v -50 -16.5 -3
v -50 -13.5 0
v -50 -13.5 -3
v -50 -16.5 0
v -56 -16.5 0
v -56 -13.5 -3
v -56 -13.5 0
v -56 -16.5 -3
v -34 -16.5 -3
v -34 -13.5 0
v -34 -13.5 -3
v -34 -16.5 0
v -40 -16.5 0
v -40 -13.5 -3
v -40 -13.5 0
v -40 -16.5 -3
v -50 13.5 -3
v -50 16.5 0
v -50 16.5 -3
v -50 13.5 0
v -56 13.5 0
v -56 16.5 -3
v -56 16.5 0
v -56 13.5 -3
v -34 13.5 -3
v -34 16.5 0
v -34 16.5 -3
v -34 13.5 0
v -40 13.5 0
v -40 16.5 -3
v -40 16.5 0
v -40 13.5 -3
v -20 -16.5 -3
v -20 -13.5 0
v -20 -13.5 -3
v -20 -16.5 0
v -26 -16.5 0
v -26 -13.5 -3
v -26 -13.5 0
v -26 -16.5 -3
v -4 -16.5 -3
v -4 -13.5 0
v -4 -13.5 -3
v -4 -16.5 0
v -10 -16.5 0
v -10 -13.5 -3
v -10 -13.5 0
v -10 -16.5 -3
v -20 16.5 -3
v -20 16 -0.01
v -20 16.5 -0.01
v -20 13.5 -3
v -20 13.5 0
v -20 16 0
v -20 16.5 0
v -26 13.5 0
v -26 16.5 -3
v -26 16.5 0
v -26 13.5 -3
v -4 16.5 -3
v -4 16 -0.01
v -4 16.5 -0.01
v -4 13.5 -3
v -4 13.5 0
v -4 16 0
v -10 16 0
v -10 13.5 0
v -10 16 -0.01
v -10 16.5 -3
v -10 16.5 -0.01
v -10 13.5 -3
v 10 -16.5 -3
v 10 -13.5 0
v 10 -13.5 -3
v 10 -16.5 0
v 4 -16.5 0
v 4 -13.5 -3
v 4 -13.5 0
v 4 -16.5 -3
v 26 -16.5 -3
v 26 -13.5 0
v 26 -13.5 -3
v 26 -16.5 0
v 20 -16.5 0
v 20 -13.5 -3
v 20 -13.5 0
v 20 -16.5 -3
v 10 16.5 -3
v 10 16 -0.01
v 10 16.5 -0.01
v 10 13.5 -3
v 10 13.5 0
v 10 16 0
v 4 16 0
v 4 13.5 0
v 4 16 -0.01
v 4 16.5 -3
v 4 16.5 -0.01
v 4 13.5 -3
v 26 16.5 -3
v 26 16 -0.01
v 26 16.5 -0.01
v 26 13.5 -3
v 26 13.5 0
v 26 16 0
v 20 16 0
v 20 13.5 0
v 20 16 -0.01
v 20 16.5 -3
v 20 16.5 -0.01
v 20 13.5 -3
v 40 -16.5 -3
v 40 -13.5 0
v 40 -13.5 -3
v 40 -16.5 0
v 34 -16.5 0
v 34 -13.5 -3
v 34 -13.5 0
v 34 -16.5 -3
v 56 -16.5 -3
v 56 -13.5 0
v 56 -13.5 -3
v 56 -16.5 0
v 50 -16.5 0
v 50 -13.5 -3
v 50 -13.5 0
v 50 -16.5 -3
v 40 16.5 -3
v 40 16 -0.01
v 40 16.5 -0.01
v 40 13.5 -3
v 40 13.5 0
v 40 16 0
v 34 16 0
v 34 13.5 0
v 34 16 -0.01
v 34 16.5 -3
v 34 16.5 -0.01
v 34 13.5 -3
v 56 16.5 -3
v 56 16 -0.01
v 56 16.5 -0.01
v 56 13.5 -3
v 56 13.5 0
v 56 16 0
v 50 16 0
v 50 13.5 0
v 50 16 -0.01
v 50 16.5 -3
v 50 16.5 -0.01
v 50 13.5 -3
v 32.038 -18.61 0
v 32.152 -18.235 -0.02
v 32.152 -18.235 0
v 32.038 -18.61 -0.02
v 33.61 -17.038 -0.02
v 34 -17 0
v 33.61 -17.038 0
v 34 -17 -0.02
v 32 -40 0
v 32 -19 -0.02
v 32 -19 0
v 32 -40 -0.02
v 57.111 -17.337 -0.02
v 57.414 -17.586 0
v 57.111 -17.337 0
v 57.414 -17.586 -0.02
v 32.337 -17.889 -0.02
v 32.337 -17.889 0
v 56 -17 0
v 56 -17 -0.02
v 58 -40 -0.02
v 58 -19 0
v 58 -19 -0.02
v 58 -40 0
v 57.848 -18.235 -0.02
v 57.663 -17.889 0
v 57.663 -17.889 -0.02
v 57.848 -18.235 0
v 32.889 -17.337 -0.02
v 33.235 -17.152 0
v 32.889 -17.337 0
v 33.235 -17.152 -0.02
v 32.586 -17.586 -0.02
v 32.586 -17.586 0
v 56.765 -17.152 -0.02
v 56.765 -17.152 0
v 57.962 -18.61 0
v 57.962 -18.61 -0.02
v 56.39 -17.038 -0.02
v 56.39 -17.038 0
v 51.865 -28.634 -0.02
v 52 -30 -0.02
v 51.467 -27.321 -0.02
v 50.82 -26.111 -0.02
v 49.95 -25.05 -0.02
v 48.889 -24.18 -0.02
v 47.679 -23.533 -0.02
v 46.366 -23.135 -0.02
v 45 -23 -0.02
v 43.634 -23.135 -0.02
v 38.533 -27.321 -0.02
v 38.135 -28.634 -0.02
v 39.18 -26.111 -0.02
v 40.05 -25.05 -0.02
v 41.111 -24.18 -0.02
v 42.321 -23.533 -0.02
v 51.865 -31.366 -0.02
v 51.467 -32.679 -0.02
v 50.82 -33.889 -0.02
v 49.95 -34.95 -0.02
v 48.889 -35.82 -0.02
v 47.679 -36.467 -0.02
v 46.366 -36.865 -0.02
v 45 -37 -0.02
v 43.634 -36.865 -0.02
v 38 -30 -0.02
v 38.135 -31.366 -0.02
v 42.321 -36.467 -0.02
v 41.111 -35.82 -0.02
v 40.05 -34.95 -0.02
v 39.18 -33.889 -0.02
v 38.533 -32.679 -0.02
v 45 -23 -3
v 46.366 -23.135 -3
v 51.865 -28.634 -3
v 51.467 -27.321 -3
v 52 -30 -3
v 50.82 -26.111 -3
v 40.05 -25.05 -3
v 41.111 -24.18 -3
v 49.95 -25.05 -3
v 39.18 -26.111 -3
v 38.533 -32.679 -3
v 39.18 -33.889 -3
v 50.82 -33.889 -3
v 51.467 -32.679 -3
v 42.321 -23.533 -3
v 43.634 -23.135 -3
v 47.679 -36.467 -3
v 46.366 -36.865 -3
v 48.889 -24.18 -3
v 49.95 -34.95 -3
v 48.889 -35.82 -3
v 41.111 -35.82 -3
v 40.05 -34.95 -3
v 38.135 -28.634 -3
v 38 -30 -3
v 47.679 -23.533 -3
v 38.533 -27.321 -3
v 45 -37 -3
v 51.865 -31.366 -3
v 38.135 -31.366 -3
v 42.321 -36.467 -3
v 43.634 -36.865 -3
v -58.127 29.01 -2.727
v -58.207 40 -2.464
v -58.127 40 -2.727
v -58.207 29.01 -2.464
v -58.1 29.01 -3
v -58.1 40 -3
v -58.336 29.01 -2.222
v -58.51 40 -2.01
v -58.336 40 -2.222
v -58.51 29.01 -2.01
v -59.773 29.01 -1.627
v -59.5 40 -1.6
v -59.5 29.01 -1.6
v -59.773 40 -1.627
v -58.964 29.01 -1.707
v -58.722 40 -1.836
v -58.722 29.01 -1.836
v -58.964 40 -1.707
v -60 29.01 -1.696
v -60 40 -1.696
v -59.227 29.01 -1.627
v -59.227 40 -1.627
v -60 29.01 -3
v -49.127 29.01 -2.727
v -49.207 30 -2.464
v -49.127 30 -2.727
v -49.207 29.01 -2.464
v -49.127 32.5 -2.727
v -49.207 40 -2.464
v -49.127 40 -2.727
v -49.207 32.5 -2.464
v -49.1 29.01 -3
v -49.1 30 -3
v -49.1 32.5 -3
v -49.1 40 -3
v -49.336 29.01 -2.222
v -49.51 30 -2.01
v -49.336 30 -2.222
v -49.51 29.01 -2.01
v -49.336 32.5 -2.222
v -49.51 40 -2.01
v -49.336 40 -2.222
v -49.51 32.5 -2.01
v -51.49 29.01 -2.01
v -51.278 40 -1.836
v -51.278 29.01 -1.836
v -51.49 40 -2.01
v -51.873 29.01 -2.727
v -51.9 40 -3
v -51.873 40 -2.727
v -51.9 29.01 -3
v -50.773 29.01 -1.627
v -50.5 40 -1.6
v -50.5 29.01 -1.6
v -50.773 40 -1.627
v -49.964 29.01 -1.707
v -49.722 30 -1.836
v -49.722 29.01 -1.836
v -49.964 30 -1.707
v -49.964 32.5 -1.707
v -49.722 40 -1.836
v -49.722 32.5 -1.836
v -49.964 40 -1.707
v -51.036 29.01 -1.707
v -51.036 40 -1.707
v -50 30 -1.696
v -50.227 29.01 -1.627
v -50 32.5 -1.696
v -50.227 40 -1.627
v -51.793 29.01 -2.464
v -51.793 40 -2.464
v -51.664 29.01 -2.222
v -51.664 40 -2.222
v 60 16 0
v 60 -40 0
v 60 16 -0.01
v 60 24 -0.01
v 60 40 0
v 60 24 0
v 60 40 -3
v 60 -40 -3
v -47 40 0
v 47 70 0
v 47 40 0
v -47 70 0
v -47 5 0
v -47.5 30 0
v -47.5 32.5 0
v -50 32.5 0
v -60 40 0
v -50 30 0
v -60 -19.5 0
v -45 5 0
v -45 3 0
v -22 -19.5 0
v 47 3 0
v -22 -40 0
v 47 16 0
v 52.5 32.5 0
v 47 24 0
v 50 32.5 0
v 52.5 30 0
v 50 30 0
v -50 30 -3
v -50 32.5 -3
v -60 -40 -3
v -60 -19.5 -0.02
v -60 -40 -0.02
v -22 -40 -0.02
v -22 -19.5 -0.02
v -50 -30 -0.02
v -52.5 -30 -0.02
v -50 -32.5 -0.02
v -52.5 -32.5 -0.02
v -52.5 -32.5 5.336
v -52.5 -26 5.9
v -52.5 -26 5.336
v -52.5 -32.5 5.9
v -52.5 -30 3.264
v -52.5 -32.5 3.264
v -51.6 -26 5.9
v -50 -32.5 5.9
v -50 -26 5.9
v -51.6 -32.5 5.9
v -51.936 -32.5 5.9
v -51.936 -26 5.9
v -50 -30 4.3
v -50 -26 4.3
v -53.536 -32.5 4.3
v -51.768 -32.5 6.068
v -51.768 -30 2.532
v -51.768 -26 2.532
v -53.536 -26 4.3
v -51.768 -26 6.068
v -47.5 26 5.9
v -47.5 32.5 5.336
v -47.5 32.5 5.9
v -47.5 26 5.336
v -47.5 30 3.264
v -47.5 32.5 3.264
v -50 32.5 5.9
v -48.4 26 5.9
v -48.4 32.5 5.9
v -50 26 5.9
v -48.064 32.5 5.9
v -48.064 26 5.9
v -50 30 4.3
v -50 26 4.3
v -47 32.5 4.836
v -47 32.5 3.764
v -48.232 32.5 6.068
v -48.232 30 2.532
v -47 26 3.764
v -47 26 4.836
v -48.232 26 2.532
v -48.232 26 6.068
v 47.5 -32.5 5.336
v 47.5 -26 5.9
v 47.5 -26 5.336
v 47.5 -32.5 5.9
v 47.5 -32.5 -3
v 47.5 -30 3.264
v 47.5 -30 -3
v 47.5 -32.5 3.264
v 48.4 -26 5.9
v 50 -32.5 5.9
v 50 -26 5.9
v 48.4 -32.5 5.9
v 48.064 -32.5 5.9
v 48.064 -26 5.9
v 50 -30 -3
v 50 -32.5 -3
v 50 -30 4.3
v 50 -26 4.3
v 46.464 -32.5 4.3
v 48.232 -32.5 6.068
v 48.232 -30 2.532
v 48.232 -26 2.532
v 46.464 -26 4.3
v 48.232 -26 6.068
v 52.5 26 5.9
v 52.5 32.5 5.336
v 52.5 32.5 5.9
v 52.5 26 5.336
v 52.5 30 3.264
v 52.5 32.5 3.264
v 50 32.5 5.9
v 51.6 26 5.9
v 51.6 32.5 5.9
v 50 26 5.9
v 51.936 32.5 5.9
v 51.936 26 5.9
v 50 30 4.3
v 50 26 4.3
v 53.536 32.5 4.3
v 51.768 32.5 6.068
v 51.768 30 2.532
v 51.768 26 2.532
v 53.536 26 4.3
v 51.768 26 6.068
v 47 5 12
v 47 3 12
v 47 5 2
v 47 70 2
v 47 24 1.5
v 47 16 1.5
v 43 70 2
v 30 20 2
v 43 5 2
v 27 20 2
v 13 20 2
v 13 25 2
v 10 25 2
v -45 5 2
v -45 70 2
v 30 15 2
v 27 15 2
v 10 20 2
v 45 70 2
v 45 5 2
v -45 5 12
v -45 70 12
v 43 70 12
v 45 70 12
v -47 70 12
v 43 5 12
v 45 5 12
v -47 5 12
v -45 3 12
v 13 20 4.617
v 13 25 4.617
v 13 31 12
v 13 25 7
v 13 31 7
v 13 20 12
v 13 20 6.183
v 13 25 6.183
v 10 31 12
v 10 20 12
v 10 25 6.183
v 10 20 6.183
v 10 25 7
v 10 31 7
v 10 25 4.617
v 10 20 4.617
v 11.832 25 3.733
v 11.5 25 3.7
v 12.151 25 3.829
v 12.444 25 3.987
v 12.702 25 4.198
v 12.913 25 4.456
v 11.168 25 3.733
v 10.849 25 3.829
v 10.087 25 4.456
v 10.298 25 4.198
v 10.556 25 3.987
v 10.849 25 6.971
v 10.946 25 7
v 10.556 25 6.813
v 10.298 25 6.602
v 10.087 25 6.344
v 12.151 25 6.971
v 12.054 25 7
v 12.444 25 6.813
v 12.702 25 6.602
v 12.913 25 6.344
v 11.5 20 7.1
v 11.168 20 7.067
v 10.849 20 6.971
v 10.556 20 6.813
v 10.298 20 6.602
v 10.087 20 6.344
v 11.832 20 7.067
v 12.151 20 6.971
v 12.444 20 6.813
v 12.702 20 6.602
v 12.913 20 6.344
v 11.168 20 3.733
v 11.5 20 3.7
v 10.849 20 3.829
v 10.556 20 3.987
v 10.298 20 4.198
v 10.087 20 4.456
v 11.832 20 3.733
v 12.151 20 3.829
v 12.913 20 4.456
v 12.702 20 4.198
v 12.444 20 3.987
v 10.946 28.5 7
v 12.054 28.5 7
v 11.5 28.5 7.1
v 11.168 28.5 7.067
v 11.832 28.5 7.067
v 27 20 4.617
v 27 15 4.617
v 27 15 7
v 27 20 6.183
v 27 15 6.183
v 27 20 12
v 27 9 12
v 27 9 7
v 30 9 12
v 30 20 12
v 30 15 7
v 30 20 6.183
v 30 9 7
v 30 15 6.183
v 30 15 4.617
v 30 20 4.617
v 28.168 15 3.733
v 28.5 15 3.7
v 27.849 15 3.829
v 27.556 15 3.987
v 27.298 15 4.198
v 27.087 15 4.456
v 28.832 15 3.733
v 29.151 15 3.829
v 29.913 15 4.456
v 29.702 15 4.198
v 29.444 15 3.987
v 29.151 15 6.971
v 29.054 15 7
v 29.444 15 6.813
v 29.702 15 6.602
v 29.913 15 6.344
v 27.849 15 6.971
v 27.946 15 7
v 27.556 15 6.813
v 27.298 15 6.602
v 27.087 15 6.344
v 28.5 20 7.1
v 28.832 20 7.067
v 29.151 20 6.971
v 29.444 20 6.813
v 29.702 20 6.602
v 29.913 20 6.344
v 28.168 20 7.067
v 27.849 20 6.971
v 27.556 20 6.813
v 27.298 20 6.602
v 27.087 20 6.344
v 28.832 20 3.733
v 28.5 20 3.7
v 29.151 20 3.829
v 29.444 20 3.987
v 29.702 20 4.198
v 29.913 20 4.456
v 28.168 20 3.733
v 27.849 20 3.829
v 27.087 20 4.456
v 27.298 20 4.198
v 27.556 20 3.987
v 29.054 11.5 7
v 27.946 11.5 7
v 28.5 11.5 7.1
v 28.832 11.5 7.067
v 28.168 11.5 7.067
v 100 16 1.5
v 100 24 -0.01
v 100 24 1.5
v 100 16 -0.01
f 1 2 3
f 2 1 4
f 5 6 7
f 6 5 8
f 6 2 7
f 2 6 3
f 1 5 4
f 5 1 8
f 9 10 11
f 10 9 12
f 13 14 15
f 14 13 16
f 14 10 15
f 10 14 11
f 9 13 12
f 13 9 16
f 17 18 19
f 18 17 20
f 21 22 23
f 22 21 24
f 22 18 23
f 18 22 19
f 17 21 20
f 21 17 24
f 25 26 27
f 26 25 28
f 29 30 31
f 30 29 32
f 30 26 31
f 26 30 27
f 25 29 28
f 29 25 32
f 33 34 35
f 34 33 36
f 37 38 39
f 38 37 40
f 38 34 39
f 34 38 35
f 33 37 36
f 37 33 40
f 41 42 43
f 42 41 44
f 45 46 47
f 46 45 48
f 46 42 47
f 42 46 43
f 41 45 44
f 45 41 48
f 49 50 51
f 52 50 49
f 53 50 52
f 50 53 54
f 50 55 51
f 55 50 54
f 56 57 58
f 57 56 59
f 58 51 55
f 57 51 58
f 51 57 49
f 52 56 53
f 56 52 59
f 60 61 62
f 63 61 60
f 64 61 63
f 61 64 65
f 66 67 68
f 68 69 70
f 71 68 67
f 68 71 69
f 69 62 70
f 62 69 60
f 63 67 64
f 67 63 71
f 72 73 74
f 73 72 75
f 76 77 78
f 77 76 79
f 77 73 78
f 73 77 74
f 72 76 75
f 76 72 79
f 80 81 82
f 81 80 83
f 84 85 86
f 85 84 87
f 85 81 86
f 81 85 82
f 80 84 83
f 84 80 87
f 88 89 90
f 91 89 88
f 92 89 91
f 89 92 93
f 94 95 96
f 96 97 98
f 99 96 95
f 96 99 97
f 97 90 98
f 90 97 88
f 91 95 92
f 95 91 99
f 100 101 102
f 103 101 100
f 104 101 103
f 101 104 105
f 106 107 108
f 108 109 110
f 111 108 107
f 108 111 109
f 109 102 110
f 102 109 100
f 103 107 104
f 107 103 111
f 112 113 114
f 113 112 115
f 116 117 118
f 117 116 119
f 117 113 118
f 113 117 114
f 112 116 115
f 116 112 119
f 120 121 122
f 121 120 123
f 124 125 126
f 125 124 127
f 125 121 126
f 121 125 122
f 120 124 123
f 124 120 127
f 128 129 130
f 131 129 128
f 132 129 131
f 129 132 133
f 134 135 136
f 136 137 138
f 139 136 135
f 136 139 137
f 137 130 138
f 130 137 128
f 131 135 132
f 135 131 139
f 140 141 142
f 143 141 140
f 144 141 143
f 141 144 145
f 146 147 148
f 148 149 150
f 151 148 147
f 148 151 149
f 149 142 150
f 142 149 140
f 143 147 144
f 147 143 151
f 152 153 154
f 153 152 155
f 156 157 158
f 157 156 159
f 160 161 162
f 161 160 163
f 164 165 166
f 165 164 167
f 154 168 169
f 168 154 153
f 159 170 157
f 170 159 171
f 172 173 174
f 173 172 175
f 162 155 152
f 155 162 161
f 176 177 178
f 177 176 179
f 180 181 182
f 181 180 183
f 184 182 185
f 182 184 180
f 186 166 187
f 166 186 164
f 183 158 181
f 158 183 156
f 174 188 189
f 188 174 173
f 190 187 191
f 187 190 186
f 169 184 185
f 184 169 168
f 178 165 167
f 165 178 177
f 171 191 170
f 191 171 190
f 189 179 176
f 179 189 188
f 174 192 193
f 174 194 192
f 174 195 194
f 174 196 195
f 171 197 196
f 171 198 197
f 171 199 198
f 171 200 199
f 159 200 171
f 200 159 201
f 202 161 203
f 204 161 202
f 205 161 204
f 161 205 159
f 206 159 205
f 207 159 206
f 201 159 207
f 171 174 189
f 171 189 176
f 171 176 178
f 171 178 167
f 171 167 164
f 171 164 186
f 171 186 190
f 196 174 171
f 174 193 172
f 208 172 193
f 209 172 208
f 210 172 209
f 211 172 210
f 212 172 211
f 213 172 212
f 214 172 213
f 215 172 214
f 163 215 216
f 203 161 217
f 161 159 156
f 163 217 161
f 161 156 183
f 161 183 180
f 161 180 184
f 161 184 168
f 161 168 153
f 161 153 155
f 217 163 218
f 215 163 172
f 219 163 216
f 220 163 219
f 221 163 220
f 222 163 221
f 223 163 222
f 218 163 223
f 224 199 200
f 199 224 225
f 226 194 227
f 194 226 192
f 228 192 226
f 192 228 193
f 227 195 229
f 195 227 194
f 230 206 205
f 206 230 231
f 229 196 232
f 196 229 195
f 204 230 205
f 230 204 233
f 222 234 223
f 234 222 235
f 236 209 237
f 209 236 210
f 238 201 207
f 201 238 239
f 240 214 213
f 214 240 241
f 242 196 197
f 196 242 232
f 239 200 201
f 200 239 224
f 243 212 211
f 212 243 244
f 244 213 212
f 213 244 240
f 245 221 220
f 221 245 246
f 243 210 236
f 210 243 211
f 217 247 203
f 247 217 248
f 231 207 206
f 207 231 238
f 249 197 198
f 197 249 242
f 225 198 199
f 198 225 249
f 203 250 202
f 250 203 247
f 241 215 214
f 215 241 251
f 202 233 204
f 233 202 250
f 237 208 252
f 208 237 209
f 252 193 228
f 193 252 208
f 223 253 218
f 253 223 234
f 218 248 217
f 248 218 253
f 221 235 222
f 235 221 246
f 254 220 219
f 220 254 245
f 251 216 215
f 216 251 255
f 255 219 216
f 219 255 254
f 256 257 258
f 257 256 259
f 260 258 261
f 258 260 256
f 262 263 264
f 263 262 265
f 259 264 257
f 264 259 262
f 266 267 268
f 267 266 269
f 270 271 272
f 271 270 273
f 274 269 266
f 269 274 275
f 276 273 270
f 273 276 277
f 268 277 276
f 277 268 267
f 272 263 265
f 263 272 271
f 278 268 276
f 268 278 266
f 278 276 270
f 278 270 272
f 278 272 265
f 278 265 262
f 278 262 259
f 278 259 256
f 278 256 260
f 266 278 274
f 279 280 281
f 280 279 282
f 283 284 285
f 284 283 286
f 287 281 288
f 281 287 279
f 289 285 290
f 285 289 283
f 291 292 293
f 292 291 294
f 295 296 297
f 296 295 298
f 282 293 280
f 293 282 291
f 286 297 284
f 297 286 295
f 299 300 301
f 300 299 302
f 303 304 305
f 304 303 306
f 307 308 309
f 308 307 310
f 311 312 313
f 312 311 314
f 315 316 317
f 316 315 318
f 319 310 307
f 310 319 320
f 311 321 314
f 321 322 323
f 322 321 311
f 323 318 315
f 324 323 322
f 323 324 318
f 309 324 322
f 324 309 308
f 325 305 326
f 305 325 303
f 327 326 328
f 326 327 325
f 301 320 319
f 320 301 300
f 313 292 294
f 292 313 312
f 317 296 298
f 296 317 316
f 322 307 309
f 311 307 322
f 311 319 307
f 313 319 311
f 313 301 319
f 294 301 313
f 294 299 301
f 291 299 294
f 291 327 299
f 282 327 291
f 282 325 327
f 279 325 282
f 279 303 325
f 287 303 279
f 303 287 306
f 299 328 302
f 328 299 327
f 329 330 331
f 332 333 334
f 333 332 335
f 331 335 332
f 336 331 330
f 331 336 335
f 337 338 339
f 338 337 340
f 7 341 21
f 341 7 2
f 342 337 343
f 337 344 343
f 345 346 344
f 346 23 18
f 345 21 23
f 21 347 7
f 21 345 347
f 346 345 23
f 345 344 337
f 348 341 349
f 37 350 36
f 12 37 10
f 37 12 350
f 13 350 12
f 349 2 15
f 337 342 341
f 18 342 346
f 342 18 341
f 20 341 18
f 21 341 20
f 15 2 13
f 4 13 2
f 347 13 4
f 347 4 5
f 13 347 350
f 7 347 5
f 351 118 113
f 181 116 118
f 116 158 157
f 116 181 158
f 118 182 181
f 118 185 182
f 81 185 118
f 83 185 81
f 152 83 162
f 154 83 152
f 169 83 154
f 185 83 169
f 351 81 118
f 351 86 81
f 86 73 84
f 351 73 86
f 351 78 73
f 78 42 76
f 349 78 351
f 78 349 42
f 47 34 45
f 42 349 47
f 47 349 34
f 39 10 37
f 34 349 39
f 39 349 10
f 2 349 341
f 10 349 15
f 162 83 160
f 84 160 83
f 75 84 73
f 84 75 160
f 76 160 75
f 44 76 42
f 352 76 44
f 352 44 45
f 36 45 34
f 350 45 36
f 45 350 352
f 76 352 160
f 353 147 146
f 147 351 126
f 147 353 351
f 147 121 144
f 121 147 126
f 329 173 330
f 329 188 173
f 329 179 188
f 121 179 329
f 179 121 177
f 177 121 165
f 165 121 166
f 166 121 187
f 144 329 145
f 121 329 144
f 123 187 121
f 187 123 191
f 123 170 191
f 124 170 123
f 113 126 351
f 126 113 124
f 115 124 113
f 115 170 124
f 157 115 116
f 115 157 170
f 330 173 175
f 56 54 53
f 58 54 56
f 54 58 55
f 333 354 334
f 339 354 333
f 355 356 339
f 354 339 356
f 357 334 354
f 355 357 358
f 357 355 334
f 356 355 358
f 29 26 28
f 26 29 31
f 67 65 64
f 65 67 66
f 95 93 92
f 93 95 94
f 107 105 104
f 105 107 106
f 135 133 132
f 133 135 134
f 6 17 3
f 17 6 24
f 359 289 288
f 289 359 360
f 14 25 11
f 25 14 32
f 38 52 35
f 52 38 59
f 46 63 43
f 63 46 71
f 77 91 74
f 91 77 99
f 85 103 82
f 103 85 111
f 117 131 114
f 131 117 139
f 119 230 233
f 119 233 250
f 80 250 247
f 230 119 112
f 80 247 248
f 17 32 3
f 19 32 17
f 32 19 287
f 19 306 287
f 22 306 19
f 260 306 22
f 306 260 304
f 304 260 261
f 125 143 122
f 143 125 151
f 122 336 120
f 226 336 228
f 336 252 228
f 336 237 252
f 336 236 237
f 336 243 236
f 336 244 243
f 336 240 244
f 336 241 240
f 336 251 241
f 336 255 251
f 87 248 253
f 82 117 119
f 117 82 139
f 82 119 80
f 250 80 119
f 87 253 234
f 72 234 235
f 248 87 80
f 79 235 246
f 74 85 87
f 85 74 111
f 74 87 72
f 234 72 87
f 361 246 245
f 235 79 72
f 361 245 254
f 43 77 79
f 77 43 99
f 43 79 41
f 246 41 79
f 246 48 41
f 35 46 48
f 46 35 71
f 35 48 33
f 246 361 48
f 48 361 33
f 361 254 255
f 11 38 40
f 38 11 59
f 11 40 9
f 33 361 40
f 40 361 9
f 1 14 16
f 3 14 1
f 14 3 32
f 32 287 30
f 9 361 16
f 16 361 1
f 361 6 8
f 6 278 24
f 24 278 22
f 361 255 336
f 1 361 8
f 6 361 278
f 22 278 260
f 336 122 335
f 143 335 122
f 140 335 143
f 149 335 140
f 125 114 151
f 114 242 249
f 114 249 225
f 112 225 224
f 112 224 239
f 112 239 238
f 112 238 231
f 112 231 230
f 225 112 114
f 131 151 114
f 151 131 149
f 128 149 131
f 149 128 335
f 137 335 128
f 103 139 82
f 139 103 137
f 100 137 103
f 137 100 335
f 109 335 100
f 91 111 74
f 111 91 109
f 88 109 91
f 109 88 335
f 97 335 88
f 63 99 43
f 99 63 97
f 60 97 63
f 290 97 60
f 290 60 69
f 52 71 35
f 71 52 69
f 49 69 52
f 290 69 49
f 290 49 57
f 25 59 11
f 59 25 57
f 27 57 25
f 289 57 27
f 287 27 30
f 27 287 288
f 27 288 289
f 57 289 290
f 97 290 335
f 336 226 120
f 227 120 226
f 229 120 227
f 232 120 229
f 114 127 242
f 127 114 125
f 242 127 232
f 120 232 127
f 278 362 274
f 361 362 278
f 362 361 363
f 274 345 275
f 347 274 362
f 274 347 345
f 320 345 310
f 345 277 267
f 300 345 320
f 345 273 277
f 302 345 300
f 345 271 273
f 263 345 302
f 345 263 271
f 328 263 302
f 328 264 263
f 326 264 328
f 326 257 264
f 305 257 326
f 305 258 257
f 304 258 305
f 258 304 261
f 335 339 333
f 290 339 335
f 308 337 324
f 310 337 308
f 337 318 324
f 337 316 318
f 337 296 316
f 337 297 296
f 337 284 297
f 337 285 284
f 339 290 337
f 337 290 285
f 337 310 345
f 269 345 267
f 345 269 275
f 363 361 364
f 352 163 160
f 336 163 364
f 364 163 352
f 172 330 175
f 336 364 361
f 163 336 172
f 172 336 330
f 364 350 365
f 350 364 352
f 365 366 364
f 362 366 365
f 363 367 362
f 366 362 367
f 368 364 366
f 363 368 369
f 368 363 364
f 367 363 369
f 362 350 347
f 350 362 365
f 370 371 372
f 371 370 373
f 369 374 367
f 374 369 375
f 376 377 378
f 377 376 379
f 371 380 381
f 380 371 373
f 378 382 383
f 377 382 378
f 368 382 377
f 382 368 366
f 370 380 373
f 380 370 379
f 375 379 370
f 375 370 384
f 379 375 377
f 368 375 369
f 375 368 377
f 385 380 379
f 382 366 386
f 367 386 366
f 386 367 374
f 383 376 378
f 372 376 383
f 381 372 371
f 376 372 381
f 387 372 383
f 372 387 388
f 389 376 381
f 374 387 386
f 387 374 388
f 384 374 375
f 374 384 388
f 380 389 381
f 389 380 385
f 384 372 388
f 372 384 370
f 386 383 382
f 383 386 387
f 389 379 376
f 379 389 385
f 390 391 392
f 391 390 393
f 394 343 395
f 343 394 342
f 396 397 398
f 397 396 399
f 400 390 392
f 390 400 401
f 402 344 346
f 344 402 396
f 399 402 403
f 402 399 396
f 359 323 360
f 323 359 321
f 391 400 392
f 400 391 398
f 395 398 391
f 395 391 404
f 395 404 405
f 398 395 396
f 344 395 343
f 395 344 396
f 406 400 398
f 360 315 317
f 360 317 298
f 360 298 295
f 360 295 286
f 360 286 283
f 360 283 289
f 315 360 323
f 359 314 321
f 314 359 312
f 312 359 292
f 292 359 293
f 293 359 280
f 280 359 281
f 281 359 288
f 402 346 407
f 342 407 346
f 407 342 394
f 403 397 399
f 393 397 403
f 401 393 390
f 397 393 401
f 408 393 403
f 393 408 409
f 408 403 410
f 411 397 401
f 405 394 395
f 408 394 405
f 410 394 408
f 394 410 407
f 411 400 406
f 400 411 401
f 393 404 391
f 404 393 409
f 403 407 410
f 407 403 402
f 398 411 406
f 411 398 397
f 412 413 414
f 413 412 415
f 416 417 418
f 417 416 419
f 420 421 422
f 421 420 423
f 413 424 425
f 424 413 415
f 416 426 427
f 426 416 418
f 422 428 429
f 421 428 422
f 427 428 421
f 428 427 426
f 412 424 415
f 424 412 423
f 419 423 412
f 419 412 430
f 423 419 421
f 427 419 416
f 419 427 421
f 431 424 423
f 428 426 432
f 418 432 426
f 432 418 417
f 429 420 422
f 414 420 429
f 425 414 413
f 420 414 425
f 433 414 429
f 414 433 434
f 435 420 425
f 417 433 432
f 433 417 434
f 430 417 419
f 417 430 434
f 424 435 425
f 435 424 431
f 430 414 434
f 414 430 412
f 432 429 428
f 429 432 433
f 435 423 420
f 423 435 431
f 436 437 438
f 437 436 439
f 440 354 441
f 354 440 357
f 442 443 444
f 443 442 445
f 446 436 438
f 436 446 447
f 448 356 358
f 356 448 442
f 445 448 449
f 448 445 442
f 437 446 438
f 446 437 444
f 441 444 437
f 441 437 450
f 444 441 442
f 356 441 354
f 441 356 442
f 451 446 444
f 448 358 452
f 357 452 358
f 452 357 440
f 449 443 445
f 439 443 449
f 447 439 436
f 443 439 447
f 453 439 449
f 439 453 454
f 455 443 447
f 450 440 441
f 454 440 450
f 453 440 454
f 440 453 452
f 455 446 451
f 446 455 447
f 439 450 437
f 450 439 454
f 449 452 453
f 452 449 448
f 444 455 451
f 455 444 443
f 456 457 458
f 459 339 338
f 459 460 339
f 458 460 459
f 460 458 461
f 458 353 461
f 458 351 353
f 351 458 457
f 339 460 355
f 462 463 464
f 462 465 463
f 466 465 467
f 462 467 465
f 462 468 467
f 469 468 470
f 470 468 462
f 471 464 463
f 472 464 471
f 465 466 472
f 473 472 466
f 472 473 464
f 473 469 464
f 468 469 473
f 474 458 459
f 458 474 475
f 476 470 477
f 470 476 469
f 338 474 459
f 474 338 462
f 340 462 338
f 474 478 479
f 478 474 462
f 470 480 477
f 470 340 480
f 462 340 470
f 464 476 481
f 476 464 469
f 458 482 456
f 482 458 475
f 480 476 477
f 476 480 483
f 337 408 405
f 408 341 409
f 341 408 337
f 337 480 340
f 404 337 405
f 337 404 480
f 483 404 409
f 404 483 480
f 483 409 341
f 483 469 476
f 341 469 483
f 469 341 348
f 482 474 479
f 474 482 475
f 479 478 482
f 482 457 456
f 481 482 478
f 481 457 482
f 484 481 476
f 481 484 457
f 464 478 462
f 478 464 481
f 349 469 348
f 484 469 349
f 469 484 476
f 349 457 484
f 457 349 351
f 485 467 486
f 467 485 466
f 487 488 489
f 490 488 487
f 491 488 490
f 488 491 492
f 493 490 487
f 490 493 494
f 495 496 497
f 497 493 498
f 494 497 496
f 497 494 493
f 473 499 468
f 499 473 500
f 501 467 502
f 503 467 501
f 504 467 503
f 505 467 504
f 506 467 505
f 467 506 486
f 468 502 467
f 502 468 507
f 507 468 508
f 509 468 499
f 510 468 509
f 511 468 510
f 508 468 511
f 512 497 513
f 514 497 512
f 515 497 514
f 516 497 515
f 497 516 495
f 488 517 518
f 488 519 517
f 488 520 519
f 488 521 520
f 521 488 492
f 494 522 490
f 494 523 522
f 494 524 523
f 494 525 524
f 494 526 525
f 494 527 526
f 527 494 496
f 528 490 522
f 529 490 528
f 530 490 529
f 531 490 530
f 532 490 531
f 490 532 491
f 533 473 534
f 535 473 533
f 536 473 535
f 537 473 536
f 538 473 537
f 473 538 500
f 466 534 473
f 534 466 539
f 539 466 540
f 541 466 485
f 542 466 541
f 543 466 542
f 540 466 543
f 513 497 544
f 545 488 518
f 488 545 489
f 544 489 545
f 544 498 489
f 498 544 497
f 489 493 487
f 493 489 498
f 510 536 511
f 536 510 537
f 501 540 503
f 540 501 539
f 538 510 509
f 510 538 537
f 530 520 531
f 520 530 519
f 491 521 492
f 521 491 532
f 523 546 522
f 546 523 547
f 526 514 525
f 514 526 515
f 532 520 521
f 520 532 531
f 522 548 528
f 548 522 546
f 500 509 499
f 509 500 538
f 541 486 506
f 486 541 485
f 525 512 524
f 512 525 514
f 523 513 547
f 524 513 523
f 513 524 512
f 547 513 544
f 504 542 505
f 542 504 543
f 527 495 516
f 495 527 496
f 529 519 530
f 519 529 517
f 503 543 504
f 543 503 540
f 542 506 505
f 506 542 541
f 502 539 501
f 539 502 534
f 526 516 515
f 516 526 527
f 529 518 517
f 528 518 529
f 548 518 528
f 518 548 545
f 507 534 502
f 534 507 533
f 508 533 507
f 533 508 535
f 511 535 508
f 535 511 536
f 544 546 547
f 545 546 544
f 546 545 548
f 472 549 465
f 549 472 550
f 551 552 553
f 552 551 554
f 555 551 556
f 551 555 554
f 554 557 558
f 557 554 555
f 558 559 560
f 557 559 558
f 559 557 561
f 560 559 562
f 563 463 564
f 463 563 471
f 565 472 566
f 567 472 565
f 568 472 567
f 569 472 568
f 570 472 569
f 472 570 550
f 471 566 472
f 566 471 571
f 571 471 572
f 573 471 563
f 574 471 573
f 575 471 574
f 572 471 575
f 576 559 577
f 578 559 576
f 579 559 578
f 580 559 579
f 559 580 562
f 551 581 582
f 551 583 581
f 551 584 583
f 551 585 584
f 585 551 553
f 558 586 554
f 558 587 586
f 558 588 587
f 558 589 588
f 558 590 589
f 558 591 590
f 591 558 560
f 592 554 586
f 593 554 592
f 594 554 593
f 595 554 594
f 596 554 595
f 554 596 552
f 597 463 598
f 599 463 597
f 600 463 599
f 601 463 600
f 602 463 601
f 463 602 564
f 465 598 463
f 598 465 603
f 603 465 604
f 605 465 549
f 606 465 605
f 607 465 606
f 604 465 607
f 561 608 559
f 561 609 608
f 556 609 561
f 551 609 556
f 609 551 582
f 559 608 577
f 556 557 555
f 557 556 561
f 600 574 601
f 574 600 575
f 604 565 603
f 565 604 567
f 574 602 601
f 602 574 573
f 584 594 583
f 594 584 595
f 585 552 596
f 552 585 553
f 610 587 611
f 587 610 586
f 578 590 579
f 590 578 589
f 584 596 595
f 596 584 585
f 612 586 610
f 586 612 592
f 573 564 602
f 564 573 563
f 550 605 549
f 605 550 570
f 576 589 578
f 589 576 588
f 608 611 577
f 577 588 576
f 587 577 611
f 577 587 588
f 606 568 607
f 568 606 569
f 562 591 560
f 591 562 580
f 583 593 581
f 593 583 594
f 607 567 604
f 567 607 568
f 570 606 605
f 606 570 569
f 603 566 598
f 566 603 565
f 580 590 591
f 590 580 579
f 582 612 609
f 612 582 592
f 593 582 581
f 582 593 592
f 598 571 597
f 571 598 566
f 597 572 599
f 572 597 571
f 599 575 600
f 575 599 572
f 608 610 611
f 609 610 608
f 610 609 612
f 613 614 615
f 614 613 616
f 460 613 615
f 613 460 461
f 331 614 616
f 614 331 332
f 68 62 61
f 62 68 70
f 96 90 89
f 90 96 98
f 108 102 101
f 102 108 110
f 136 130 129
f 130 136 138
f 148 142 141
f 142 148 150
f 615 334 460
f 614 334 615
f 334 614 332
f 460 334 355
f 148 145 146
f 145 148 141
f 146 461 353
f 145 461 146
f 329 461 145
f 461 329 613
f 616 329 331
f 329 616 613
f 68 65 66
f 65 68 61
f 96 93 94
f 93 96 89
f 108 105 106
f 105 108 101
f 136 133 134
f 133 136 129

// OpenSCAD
//=============================================================================
// body_v4_addons.scad —— 车身 v4 的"可插入模块"
//
// ★ 用法：**不要重写 body_v3.scad** ✗
//   把本文件的内容拷到 body_v3.scad 末尾，然后在需要的地方调用下面这些
//   module —— 加在 difference() 外面（实体）或里面（开孔）都行。
//
//   设计原则沿用你们 v3 的：
//     · 优先"形状互锁"，不用弹性变形（卡扣会断）
//     · 竖直生长的细小特征不许承力
//     · 大面朝下打印
//
// 坐标约定（和 body_v3 一致）：
//   x = 前后（+x 向前）, y = 左右, z = 高度（0 = 下层底面）
//   内腔：x ∈ [-(L/2-WALL), +(L/2-WALL)]，y ∈ [-(W/2-WALL), +(W/2-WALL)]
//=============================================================================

// ---------------- 车身参数（和 body_v3 对齐）----------------
WALL  = 3;
FLOOR = 3;
L     = 225;      // 缩小后
W     = 125;
H1    = 45;
H2    = 50;
IN_X  = L/2 - WALL;
IN_Y  = W/2 - WALL;

BOARD_T = 1.6;    // 板厚（FPGA / K230 都约 1.6）
M3_TAP  = 2.8;    // M3 自攻底孔
$fn = 32;

//=============================================================================
// 1) L 形边夹 —— 夹住板边（不依赖安装孔）
//
//   立于底板上，顶部有个向内的"爪"，板从侧面滑进去被压住。
//   hook=true 时爪更长（滑入式）；false 时是纯挡边。
//
//   用法：在底板上放 4 个，两两相对，夹住板的两条对边。
//=============================================================================
module board_clamp(t = BOARD_T, h = 7, reach = 4, th = 2.5, hook = true) {
    gap = 0.3;                       // 板与爪的间隙（宁松勿紧）
    union() {
        // 竖柱（立在底板上，z 从 0 开始）
        cube([th, th, h + t + gap]);
        // 顶部爪：从柱子向 -y 方向伸，压住板的上表面
        translate([0, -reach, h + gap])
            cube([th, th + reach, t]);
        if (hook) {
            // 滑入斜角（导向，板一推就进去）
            translate([0, -reach, h + gap])
                rotate([0, 45, 0])
                    cube([th, th + reach, th]);
        }
    }
}

//=============================================================================
// 2) 扎带孔对 —— 2 个腰形孔 + 中间留桥
//
//   任何模块都能用扎带绑住（后买的降压模块尺寸未知也能装 ✓）
//   从底板穿透（z 方向），跨度 span，孔径 w。
//=============================================================================
module zip_slots(span = 16, w = 3, l = 6, z0 = 0, h = FLOOR) {
    for (sx = [-1, 1])
        translate([sx*span/2 - l/2, -w/2, z0 - 0.01])
            cube([l, w, h + 0.02]);
}

// 扎带孔阵列（底板上一排，间距 pitch）
module zip_grid(nx = 5, ny = 3, pitch = 20, span = 16, z0 = 0) {
    for (ix = [0 : nx-1])
        for (iy = [0 : ny-1])
            translate([(ix - (nx-1)/2) * pitch, (iy - (ny-1)/2) * pitch, 0])
                zip_slots(span = span, z0 = z0);
}

//=============================================================================
// 3) 卡槽/兜 —— 3 面挡边 + 一面开口（模块从开口滑进去）
//
//   用于：电池、充电宝、降压模块（尺寸不确定的都能卡）
//   内腔 = W × D，壁厚 th，高 h
//=============================================================================
module cradle(Wi = 40, Di = 20, h = 12, th = 2, open_dir = "y+") {
    // 底板
    cube([Wi + 2*th, Di + 2*th, th]);
    // 三面墙（按 open_dir 省一面）
    if (open_dir != "x-") translate([-th, 0, 0]) cube([th, Di + 2*th, h]);
    if (open_dir != "x+") translate([Wi, 0, 0])  cube([th, Di + 2*th, h]);
    if (open_dir != "y-") translate([0, -th, 0]) cube([Wi + 2*th, th, h]);
    if (open_dir != "y+") translate([0, Di, 0])  cube([Wi + 2*th, th, h]);
}

//=============================================================================
// 4) 方形沉台 —— 摄像头（方形模块，掉不出来）
//
//   从【内表面】往墙里挖 depth 深、size × size 的方形坑，四角 R2。
//   中间再开一个圆通孔让镜头看出去（light_d）。
//   用法（放在 difference() 里）：
//     translate([x, y, z_wall_inner]) square_pocket(26, 2, 14);
//=============================================================================
module square_pocket(size = 26, depth = 2, light_d = 14) {
    r = 2;
    translate([0, 0, -0.01])
        hull() {
            for (sx = [-1, 1], sy = [-1, 1])
                translate([sx*(size/2 - r), sy*(size/2 - r), 0])
                    cylinder(r = r, h = depth + 0.01);
        }
    // 让镜头看出去的通孔（穿墙）
    translate([0, 0, -depth - 50])
        cylinder(d = light_d, h = 200);
}

//=============================================================================
// 5) 矩形沉台 —— 超声波 HC-SR04（孔尺寸不变，只加台阶防脱）
//=============================================================================
module rect_pocket(px = 46, py = 21, depth = 2) {
    translate([-px/2, -py/2, -0.01])
        cube([px, py, depth + 0.01]);
}

//=============================================================================
// 6) 挡件安装座 —— 侧壁外侧加厚 + 2 个自攻底孔
//
//   舵机是"穿墙式"，腿在【墙外】→ 挡件必须装在墙外 ✗
//   所以在侧壁外面加一块 16×14×6 的凸台，再开 2 个 φ2.8 底孔。
//
//   用法（实体，加在 difference() 外面）：
//     translate([x, ±(W/2), z]) stop_boss();
//   孔（放在 difference() 里）用 stop_boss_holes()
//=============================================================================
module stop_boss(w = 16, d = 6, h = 14) {
    // 贴墙的那个面在 y=0，往外（+y）长 d
    translate([-w/2, 0, -h/2])
        cube([w, d, h]);
    // 根部过渡（避免 90° 应力集中）
    translate([-w/2, -1.5, -h/2])
        cube([w, 1.5, h]);
}

module stop_boss_holes(w = 16, d = 6, pitch = 9) {
    // 2 个水平孔，从外侧打进墙
    for (sx = [-1, 1])
        translate([sx*pitch/2, d + 0.01, 0])
            rotate([90, 0, 0])
                cylinder(d = M3_TAP, h = d + WALL + 3);
}

//=============================================================================
// 7) 可调卡槽 —— 底板浅槽 + 2 个滑动 L 夹块
//
//   后买的降压模块尺寸未知？先用浅槽定位，再用 2 个夹块（M3 锁）夹住
//=============================================================================
module slot_channel(len = 120, wid = 8, dep = 1.5) {
    translate([-len/2, -wid/2, -0.01])
        cube([len, wid, dep + 0.01]);
}

module slider_clamp(h = 12, th = 3, tab = 5) {
    difference() {
        union() {
            cube([th, tab, h]);                       // 竖块
            translate([0, 0, h - tab])
                cube([th, tab * 2.2, tab]);           // 顶部压爪
        }
        // M3 长孔（锁紧用）
        translate([th/2, tab/2, h * 0.45])
            rotate([90, 0, 0])
                cylinder(d = 3.4, h = tab * 2 + 2, center = true);
    }
}

//=============================================================================
// 8) 演示：把上面几个拼一下，F5 看效果（交付时删掉或 SHOW_DEMO=false）
//=============================================================================
SHOW_DEMO = true;

if (SHOW_DEMO) {
    // 一块 120×80 的假底板
    difference() {
        translate([-60, -40, -FLOOR]) cube([120, 80, FLOOR]);
        // 扎带孔阵列
        translate([0, 0, -FLOOR]) zip_grid(nx = 4, ny = 2, pitch = 30, span = 16);
        // 摄像头方形沉台（挖在右下角）
        translate([45, -30, -0.01]) square_pocket(26, 2, 14);
        // 超声波矩形沉台（挖在左下角）
        translate([-45, -30, -0.01]) rect_pocket(46, 21, 2);
        // 挡件底孔
        translate([-55, 35, -FLOOR]) stop_boss_holes();
    }
    // 4 个 L 边夹（夹一块 100×60 的假板）
    for (sx = [-1, 1], sy = [-1, 1])
        translate([sx*50, sy*30, -FLOOR + 0])
            rotate([0, 0, (sy > 0) ? 0 : 180])
                board_clamp();
    // 电池兜
    translate([-45, 5, 0]) cradle(88, 61, 12, 2, "y+");
    // 降压模块卡槽
    translate([40, 20, 0]) slot_channel(120, 8, 1.5);
    translate([10, 20, 0]) slider_clamp();
    translate([30, 20, 0]) rotate([0, 0, 180]) slider_clamp();
}
